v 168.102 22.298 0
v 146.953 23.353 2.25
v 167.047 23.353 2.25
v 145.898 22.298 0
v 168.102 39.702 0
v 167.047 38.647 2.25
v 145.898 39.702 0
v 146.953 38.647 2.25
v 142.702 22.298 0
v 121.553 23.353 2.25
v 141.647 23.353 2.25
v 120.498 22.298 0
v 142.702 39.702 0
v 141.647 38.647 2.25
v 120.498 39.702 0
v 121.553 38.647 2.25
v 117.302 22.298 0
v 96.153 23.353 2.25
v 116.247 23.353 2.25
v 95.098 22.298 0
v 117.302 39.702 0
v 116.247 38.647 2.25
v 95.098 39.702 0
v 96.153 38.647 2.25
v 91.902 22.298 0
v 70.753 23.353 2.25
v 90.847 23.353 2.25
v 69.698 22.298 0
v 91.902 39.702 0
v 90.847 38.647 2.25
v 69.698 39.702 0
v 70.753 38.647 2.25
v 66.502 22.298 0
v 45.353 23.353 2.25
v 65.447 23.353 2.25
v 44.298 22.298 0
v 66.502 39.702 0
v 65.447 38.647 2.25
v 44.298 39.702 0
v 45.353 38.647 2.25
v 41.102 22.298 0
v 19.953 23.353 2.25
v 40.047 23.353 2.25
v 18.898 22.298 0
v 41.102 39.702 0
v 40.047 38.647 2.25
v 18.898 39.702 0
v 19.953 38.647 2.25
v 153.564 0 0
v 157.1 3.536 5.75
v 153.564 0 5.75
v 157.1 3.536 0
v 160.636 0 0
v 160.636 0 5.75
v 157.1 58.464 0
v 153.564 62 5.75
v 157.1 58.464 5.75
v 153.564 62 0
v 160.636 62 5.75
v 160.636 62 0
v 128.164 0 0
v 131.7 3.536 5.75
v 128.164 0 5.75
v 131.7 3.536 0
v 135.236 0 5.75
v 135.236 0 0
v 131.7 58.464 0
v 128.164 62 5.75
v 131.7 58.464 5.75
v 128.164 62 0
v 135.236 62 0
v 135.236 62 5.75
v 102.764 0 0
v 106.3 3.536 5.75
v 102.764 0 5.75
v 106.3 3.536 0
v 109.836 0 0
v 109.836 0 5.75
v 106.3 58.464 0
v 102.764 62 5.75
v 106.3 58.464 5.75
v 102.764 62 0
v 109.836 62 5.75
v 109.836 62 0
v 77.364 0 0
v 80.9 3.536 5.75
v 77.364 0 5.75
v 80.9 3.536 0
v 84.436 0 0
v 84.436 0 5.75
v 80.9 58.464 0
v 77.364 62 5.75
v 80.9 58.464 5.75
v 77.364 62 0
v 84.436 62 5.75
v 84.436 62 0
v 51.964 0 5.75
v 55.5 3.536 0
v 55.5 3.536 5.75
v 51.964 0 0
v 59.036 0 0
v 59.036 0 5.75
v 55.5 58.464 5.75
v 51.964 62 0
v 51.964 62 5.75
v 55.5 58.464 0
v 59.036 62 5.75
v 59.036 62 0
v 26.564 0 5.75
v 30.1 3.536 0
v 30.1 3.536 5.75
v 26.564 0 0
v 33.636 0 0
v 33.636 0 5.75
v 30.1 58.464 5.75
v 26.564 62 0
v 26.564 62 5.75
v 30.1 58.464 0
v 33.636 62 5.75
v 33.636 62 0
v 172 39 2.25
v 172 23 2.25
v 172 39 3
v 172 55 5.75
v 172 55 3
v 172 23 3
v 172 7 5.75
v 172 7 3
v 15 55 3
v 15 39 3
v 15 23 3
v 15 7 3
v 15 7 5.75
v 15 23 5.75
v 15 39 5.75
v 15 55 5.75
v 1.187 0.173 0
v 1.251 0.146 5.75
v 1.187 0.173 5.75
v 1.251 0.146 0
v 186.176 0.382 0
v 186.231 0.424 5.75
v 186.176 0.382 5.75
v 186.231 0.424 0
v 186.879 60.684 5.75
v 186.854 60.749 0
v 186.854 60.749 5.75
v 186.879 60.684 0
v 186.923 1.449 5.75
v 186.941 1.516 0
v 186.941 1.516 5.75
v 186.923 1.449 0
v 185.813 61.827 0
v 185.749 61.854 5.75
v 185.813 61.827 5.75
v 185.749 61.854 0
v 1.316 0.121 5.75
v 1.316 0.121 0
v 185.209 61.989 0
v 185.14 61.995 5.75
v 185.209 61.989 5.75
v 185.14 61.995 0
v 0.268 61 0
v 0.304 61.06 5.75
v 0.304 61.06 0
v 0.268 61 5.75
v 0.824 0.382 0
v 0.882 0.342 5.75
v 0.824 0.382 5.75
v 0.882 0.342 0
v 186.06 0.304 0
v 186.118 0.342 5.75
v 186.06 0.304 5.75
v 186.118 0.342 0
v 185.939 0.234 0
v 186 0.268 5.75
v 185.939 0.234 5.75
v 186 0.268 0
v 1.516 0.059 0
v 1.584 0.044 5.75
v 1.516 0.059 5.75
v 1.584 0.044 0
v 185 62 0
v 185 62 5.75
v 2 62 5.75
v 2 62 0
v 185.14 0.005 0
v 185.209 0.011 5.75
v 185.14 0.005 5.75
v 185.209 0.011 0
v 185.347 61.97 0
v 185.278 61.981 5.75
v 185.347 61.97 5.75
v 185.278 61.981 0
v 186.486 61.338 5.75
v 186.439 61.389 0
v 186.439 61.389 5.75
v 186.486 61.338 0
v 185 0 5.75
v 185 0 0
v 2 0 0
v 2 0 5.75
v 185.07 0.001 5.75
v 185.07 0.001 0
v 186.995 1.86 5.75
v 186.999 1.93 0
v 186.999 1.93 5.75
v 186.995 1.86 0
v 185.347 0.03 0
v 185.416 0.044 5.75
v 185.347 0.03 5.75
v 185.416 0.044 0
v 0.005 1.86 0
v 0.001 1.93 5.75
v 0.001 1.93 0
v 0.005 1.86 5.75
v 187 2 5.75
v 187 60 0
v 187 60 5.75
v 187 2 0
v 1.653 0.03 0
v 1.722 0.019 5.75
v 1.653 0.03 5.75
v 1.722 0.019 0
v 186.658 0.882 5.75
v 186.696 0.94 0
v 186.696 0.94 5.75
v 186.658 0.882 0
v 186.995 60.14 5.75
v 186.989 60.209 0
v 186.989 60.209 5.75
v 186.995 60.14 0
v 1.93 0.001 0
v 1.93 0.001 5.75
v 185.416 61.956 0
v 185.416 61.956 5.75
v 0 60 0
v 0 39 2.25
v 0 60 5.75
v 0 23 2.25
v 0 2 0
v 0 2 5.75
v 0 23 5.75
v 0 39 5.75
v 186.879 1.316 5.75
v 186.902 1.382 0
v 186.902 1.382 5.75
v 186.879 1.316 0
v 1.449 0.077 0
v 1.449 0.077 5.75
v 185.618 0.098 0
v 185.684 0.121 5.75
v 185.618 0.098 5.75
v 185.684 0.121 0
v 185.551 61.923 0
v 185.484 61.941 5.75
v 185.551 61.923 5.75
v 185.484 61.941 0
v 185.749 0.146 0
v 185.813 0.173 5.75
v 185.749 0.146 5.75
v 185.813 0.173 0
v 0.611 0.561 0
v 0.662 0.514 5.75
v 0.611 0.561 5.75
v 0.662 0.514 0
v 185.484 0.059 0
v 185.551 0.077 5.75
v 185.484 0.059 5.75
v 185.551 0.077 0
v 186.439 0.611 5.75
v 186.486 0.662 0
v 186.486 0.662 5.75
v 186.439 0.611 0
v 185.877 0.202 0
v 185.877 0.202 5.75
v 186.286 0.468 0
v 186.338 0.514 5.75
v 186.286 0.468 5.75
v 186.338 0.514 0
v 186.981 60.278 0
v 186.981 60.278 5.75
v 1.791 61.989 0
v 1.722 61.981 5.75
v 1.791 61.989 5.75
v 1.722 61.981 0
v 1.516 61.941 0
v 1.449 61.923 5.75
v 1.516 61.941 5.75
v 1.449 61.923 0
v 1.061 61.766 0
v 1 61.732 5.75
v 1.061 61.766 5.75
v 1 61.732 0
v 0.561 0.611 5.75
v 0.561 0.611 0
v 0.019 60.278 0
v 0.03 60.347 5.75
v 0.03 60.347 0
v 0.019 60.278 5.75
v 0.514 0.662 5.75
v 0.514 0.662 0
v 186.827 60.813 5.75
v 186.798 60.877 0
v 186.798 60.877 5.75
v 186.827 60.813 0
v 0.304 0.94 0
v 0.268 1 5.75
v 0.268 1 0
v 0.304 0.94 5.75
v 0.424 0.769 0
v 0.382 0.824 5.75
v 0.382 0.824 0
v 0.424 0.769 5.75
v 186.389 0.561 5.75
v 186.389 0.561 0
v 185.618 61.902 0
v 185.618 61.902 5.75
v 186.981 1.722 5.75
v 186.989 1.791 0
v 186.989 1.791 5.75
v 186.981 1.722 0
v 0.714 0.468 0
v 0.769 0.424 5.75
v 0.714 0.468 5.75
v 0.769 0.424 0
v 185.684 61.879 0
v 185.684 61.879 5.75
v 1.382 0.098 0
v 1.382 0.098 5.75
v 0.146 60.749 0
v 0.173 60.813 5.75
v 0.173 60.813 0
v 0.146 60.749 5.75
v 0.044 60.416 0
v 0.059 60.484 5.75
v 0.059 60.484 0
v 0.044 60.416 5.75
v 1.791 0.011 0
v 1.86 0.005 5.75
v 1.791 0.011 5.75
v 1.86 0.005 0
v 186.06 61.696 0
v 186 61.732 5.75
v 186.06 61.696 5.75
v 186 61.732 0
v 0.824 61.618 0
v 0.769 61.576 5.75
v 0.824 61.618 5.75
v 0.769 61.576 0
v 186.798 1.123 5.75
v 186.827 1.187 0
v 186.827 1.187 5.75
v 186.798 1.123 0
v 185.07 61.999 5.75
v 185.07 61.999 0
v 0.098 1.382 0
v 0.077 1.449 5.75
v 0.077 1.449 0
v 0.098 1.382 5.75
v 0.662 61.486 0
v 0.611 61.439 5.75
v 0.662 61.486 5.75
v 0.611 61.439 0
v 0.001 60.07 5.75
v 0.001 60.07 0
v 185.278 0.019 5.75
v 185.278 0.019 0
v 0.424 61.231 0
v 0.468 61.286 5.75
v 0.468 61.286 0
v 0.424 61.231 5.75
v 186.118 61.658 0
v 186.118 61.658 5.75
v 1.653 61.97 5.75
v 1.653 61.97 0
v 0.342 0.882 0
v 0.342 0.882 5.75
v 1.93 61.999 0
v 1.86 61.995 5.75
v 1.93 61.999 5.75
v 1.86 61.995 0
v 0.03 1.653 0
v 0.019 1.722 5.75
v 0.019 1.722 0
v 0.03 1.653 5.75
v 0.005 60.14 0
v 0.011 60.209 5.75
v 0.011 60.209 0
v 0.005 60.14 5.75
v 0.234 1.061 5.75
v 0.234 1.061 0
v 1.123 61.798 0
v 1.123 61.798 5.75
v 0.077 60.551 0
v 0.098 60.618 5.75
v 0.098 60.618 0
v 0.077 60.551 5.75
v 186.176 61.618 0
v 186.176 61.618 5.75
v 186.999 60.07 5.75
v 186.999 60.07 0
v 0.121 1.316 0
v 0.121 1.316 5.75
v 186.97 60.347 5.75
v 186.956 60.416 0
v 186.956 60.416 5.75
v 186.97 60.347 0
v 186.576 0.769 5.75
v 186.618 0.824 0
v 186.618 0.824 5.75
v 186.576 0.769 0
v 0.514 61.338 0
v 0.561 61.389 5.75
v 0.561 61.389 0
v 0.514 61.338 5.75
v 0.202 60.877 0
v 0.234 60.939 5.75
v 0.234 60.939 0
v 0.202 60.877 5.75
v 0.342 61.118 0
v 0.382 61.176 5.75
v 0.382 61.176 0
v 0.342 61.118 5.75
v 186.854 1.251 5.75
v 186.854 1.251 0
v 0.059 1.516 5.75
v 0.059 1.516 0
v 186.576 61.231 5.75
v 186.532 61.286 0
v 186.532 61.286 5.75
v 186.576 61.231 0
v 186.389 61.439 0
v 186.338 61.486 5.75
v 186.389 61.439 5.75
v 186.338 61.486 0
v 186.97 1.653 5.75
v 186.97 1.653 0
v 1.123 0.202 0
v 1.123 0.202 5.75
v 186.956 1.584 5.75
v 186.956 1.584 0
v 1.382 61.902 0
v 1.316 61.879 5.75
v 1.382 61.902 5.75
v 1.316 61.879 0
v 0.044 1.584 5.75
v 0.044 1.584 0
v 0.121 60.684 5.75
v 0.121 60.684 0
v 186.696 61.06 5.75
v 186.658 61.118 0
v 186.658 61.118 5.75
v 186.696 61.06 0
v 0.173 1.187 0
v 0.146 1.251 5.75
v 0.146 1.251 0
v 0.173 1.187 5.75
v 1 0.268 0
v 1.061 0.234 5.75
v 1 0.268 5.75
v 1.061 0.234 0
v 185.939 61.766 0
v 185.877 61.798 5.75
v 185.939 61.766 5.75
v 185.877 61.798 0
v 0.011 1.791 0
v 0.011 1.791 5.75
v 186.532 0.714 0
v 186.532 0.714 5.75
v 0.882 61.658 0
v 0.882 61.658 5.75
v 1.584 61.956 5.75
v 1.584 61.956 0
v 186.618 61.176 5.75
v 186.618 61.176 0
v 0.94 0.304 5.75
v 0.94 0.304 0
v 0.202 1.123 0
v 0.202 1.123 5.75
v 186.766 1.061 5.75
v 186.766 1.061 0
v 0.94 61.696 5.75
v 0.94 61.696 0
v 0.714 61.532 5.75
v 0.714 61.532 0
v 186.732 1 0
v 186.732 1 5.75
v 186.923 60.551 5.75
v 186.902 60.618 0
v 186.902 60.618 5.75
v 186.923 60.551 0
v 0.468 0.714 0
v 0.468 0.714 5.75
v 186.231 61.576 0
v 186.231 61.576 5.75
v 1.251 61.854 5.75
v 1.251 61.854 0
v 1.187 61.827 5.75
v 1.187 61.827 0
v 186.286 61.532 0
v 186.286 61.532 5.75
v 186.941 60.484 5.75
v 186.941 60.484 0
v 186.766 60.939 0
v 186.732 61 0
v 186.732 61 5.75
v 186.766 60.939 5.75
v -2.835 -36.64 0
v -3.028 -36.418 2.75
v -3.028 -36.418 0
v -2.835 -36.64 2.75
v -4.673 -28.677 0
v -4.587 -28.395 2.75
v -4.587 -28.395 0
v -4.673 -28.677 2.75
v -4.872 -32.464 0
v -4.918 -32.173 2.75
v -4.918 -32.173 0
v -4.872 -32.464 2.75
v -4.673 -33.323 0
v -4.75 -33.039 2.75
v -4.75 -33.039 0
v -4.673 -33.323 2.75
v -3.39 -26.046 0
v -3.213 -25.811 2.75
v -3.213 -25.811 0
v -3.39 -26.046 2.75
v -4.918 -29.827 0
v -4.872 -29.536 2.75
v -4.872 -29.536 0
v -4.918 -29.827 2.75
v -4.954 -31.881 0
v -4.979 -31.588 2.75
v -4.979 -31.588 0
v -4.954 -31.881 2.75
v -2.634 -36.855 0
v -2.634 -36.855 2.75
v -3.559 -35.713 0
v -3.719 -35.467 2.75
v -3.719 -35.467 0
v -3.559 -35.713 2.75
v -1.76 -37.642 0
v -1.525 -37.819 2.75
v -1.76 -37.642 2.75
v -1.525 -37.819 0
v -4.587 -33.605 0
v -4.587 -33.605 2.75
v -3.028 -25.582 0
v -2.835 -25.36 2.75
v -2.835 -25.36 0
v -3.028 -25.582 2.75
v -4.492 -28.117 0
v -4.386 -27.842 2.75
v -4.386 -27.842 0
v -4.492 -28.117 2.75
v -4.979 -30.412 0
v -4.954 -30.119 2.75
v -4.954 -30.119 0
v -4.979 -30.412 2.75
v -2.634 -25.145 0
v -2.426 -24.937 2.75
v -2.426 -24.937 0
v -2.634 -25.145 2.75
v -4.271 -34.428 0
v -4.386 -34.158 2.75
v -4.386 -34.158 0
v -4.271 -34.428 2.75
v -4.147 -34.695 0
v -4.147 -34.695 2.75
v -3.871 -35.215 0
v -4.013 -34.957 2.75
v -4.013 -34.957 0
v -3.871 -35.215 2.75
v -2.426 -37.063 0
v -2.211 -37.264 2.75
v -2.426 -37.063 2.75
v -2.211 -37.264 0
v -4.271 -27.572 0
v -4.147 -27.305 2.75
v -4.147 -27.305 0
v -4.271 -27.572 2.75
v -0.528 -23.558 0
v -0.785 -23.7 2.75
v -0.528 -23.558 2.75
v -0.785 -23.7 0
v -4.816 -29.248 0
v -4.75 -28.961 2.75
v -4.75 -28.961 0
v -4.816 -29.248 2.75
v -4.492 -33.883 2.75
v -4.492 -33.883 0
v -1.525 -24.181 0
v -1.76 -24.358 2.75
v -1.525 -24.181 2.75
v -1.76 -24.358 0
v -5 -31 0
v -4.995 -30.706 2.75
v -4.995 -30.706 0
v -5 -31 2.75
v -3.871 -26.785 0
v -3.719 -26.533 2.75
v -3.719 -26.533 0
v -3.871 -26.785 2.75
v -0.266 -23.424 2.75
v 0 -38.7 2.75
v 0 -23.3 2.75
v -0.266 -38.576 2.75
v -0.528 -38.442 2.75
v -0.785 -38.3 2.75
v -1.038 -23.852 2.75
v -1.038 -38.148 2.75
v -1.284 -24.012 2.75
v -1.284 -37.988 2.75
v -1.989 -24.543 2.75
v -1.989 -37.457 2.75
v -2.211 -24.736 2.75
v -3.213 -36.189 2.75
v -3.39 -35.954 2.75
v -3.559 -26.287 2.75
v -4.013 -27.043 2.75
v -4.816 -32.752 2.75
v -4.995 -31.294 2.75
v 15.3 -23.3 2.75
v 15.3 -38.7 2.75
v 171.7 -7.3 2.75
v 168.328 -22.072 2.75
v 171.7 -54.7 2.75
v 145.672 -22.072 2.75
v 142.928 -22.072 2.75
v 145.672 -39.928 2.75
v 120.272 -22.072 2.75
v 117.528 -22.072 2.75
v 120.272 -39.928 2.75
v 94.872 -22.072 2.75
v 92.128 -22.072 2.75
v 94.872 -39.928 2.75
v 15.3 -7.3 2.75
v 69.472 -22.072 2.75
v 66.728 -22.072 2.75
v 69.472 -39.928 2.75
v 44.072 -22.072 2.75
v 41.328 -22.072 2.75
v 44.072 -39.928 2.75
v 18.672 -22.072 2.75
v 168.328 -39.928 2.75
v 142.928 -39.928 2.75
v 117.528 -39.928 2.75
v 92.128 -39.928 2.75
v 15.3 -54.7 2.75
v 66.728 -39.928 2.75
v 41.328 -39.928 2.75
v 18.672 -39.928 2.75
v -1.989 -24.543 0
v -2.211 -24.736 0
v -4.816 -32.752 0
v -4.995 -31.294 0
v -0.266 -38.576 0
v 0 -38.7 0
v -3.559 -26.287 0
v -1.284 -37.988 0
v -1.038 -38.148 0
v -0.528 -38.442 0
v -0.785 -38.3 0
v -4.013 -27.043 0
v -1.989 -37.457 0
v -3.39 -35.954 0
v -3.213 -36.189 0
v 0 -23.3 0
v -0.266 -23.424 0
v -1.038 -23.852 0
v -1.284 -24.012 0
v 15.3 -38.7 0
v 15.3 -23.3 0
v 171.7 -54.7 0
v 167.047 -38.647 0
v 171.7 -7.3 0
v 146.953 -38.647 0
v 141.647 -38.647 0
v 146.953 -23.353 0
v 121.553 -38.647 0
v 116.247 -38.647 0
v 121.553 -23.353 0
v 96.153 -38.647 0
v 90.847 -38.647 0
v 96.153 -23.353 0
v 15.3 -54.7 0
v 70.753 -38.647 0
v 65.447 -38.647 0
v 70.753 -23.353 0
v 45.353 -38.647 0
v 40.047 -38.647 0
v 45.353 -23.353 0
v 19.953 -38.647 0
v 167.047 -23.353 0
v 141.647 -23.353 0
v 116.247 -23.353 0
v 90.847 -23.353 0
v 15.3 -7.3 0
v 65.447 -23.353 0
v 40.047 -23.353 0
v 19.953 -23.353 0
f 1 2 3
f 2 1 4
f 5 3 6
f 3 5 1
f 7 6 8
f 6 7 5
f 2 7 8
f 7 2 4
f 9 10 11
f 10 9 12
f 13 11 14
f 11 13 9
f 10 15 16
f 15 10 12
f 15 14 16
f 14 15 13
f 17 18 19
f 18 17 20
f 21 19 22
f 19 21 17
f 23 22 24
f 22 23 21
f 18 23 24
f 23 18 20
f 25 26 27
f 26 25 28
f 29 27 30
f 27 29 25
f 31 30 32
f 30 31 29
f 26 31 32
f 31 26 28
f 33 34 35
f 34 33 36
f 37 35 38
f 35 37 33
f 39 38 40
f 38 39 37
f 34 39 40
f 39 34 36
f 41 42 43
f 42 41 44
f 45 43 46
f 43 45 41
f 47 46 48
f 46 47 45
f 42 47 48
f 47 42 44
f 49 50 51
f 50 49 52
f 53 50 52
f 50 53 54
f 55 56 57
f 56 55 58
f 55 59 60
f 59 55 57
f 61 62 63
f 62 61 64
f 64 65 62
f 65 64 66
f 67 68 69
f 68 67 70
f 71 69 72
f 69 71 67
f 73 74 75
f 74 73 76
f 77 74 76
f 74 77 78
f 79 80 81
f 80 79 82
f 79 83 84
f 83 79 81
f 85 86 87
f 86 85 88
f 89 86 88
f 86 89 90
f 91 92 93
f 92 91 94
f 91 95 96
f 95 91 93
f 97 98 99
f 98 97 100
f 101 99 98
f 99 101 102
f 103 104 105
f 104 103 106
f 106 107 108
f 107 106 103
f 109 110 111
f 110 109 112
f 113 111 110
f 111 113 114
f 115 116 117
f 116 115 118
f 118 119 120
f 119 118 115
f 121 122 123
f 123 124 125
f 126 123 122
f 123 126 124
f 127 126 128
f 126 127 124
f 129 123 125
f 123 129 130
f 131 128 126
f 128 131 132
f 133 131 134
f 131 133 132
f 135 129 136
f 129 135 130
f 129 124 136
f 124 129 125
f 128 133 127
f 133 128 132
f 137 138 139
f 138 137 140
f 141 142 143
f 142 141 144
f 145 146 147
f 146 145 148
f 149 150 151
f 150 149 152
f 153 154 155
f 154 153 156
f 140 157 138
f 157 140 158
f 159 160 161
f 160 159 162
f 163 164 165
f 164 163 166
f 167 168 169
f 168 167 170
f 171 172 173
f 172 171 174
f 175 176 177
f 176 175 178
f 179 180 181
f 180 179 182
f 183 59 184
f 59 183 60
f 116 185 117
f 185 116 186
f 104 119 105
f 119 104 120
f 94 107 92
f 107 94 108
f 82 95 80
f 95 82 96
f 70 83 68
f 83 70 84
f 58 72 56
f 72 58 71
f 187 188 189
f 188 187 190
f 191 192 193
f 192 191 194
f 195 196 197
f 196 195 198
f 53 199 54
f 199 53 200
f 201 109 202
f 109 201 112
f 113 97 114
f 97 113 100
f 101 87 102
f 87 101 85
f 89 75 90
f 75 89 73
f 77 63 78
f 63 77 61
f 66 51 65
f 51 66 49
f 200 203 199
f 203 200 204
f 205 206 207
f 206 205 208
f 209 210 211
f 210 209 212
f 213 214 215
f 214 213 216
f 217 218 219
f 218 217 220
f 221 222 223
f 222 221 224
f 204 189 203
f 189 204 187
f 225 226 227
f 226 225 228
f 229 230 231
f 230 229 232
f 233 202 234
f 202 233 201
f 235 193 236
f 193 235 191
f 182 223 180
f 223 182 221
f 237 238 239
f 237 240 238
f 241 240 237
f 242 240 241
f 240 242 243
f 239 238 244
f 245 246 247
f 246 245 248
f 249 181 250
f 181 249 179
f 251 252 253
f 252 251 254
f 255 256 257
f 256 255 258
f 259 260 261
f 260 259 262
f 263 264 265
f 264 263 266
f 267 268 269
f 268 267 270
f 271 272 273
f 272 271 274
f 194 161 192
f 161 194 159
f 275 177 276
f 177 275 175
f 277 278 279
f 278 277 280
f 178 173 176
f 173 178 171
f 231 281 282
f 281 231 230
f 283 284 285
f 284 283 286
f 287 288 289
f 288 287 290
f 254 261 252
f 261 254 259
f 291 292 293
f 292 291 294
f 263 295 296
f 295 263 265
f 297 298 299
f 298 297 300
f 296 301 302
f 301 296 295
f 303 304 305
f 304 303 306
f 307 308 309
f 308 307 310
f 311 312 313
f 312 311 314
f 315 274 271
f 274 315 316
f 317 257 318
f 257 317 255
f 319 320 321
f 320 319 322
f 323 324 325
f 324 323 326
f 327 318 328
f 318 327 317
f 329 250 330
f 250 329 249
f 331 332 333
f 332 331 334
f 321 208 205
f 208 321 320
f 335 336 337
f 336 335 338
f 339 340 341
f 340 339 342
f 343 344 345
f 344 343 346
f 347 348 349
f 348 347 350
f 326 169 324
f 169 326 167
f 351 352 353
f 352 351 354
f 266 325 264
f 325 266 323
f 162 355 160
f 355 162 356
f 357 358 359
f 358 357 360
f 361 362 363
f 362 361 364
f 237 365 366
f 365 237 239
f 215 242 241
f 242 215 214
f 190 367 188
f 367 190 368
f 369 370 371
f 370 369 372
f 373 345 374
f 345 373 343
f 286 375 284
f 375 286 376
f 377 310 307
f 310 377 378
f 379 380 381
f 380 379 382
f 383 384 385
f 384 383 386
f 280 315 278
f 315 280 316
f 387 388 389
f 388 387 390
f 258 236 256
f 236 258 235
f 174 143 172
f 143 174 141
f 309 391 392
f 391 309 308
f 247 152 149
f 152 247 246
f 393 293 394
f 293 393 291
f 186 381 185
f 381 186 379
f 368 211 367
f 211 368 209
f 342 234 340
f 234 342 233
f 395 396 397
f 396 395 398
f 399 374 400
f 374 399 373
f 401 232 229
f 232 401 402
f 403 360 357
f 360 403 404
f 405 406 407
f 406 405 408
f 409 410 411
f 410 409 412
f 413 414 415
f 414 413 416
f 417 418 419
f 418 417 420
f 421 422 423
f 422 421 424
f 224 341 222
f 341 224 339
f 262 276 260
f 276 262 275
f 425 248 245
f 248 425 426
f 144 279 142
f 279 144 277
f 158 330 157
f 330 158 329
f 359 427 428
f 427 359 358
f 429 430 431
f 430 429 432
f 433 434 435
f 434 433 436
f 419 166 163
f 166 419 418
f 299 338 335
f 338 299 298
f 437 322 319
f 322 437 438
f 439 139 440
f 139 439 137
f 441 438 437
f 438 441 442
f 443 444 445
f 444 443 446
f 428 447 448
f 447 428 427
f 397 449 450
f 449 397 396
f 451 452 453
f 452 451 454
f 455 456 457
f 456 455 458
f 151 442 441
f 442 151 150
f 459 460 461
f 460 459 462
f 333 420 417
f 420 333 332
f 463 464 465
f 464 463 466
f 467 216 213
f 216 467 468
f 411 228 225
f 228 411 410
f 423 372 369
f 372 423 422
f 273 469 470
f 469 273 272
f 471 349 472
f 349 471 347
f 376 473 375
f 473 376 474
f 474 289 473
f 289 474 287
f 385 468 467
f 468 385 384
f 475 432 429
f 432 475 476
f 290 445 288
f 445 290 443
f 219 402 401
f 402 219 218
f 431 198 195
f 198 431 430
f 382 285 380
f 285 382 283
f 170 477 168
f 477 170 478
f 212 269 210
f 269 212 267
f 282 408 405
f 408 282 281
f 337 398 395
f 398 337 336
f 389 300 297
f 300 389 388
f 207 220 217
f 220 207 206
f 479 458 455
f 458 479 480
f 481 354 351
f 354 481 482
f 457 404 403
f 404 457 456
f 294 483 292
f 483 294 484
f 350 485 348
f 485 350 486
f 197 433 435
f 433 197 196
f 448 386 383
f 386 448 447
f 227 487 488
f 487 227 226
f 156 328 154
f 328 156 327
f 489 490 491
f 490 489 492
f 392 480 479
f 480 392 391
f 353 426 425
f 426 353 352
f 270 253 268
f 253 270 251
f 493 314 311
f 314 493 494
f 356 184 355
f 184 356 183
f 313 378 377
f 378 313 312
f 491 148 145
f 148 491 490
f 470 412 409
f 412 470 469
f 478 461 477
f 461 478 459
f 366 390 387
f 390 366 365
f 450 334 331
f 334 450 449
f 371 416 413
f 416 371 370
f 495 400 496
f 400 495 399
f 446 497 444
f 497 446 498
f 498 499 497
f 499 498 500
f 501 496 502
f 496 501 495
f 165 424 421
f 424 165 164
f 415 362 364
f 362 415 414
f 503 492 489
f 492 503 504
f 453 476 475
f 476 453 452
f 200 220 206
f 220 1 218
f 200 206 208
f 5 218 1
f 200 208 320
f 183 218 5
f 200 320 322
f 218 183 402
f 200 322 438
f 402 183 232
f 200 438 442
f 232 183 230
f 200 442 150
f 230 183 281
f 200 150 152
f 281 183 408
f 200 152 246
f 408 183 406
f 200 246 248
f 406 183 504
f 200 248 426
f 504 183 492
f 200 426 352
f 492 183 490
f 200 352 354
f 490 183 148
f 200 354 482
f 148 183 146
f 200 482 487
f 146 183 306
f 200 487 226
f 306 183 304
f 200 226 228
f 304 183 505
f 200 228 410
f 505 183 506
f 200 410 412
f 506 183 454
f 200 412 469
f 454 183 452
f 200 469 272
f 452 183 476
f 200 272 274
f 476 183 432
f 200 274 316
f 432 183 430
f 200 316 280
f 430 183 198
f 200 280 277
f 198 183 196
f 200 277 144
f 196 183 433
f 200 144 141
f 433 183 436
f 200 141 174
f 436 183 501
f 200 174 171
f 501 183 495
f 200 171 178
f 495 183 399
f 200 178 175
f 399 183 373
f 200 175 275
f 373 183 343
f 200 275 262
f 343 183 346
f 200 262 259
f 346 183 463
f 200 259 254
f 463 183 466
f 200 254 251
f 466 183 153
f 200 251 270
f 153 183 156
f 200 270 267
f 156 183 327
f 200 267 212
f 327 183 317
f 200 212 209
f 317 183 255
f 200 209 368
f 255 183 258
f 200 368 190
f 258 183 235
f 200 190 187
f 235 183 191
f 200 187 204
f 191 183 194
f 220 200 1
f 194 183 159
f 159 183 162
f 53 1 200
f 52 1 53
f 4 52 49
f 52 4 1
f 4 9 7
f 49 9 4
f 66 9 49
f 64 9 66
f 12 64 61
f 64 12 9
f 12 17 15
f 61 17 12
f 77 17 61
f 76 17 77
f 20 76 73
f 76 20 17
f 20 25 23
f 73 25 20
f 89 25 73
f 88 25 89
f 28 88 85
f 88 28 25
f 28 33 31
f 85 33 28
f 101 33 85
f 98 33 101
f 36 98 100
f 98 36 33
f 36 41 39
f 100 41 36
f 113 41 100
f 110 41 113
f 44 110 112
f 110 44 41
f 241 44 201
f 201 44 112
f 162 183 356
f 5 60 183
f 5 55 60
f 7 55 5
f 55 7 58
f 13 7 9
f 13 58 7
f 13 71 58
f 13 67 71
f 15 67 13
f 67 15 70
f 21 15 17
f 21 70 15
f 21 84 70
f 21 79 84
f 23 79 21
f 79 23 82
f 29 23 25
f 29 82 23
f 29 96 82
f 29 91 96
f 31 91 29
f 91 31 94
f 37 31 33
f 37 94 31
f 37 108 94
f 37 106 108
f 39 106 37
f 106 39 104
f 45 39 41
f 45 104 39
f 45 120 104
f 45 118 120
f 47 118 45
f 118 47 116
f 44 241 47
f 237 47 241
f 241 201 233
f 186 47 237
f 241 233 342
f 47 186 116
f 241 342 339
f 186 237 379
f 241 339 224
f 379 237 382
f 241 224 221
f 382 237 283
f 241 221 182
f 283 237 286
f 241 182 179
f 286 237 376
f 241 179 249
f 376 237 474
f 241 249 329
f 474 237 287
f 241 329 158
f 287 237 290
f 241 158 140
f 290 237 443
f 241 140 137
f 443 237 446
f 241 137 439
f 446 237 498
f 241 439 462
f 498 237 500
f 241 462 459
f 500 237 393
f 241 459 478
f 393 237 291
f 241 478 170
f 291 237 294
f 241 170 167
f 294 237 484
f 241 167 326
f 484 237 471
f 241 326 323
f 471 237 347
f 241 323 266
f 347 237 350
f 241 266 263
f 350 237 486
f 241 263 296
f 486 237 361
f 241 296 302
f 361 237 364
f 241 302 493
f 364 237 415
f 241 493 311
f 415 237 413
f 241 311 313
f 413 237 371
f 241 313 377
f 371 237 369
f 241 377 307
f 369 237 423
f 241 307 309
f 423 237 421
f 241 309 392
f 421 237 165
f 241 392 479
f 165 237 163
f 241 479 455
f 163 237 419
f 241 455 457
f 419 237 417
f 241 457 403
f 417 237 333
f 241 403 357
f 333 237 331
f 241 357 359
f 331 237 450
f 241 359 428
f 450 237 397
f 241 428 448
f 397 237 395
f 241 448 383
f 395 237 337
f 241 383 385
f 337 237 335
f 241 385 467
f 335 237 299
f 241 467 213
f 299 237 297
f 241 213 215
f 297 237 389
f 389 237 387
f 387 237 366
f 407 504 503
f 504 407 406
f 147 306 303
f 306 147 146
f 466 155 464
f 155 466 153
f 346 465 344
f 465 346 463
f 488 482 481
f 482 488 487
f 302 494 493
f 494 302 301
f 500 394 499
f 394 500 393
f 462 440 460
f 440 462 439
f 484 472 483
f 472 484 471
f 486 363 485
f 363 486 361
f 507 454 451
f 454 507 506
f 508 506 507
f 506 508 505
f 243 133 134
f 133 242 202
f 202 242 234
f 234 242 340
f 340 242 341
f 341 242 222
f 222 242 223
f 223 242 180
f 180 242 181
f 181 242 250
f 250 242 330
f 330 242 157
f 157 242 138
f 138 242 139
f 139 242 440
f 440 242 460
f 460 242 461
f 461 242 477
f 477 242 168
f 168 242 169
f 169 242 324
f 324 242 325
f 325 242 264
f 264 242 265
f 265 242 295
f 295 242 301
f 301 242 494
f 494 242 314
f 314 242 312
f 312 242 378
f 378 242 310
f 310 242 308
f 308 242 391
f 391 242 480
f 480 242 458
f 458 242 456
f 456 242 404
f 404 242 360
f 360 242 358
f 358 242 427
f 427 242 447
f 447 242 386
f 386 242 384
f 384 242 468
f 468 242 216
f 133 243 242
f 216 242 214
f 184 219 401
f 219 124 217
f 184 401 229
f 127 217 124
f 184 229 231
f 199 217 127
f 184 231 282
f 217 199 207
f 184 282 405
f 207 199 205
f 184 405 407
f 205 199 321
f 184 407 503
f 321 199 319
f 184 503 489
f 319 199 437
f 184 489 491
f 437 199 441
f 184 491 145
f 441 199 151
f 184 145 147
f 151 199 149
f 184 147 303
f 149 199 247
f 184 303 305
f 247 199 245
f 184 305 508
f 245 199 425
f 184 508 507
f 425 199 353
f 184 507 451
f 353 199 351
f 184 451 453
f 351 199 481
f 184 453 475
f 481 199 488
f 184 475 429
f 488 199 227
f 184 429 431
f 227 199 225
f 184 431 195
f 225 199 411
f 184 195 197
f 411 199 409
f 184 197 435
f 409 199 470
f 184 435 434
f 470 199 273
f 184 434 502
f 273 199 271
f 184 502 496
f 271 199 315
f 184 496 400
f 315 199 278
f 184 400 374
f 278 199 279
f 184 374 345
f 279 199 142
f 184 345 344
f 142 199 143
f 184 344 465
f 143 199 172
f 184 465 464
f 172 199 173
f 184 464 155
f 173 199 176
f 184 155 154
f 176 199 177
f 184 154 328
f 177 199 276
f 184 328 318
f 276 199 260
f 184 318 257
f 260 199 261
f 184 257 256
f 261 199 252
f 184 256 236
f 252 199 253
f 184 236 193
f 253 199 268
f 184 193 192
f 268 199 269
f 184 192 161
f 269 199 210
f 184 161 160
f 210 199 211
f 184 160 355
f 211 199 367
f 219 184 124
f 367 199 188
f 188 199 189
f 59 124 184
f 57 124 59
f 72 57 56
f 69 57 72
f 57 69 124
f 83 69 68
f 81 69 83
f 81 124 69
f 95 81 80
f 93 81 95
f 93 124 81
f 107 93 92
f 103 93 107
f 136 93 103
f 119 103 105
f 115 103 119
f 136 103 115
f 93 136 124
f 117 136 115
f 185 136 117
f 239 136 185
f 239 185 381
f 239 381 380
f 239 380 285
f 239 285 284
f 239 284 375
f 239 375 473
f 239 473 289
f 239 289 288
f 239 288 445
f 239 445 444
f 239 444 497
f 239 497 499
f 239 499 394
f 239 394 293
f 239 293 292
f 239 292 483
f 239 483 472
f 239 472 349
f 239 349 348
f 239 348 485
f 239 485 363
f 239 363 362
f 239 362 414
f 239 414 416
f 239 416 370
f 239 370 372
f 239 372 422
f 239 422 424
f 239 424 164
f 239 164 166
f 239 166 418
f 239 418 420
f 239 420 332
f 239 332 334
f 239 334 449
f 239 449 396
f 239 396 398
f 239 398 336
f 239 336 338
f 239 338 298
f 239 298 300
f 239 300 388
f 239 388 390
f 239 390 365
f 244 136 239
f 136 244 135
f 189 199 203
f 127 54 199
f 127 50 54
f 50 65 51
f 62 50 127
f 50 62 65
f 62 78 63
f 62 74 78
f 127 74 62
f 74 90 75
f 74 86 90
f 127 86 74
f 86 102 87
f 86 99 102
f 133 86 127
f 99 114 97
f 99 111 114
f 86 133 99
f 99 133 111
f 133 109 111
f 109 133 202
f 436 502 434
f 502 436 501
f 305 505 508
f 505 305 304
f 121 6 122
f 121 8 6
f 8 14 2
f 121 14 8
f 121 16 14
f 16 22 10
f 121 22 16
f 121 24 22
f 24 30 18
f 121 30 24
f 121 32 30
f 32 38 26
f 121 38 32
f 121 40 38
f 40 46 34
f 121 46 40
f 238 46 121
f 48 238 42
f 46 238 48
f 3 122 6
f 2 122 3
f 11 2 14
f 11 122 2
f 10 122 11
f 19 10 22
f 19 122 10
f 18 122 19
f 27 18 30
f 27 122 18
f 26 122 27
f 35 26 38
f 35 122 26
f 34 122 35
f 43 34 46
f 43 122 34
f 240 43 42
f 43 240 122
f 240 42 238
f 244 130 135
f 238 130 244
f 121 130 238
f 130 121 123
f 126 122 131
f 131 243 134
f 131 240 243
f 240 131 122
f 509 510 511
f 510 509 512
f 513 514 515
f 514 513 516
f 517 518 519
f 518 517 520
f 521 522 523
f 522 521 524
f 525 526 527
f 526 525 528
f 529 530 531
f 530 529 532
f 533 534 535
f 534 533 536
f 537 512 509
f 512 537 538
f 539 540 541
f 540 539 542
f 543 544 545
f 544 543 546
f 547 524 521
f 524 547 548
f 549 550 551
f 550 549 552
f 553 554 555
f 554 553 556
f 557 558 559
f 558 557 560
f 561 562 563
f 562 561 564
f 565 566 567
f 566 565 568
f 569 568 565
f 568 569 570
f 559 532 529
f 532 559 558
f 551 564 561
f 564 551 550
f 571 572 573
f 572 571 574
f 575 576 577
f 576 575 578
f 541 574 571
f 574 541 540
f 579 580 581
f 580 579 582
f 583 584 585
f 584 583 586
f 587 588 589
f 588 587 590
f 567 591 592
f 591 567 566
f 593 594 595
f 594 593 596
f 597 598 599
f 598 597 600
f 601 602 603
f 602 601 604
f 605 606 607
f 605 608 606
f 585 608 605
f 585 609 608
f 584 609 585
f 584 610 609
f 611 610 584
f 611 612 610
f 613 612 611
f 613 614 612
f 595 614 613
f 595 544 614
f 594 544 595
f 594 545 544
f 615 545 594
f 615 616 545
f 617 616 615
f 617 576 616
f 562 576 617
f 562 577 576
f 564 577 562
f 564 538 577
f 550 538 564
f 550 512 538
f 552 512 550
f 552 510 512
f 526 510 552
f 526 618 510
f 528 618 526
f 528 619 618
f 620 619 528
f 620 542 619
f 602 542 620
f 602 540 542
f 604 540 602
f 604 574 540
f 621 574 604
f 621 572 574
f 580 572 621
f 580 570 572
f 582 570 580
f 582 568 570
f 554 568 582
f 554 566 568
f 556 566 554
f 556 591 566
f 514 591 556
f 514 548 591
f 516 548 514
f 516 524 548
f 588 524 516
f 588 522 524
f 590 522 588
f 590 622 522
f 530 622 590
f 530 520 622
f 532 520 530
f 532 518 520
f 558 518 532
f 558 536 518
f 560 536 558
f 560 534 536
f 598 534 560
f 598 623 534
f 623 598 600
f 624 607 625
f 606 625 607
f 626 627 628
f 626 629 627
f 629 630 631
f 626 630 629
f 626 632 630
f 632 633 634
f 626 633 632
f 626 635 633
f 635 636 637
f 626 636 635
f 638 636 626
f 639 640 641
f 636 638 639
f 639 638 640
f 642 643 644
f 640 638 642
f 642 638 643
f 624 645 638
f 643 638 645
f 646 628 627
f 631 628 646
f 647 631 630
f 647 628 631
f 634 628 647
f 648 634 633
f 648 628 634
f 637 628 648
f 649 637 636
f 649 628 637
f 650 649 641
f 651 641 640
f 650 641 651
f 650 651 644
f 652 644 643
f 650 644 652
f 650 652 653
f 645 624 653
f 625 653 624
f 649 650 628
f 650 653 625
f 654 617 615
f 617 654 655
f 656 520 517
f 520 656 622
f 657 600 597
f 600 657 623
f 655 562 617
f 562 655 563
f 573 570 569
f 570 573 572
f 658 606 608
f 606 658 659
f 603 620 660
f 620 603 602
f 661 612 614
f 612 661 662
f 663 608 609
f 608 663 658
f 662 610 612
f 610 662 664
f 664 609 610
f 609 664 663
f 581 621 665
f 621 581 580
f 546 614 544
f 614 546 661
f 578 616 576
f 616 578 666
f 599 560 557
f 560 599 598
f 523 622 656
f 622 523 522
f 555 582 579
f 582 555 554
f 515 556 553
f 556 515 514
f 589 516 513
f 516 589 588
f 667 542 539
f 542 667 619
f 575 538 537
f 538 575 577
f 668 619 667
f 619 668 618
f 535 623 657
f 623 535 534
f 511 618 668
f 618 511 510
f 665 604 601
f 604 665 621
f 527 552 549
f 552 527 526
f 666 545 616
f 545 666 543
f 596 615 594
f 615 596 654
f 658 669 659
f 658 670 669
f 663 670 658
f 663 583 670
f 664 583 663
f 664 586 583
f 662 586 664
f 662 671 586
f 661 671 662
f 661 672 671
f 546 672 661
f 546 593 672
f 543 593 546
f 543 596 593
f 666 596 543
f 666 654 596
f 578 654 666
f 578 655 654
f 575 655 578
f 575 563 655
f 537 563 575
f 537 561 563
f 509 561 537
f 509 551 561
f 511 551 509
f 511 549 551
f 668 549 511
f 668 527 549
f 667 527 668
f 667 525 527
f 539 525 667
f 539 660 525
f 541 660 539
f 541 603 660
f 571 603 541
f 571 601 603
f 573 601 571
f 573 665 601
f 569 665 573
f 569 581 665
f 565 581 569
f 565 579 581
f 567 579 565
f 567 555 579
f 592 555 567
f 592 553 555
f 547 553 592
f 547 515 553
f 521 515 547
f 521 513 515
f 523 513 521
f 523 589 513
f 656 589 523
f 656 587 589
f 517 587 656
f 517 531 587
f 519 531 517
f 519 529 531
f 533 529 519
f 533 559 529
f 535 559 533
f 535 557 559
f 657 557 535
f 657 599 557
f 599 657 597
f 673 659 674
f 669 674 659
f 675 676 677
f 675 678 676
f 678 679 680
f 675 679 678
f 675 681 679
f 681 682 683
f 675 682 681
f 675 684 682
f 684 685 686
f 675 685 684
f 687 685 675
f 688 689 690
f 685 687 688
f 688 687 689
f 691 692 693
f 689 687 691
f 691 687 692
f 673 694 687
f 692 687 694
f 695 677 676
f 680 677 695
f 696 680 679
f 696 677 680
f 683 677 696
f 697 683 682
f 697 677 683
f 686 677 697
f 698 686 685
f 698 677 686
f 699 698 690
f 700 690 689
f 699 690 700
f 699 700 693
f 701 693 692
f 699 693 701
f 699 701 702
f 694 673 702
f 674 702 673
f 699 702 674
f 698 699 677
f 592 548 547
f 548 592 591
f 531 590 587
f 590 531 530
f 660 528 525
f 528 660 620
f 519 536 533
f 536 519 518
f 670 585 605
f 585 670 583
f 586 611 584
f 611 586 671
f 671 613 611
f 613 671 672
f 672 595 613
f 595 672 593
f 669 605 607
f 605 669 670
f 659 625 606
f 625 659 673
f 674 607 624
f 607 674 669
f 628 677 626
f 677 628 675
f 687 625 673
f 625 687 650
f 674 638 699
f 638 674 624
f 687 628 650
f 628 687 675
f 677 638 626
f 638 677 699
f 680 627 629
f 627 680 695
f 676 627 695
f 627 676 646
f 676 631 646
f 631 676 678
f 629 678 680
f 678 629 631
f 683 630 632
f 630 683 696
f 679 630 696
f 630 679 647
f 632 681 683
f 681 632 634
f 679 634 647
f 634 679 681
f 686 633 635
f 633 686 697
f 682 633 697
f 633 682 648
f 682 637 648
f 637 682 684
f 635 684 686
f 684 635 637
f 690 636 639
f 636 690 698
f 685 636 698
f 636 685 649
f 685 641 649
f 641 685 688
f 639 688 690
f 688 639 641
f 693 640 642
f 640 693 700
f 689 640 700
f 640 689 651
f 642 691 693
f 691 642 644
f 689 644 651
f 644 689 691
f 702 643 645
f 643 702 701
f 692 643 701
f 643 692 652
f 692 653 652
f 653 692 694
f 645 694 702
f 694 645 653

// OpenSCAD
/*
 * Film Holder for Plustek OpticFilm scanners and 110 films.
 *
 * (C) 2016 Richard "Shred" Körber
 *
 * Project page on Thingiverse:
 *   https://www.thingiverse.com/thing:1328672
 *
 * Licensed under Creative Commons BY-NC-SA:
 *   https://creativecommons.org/licenses/by-nc-sa/3.0/
 */


// Also depends on your printer size!
numberOfWindows = 6;    // [1:20]

// Use struts to save some material?
saveMaterial = "false"; // [false:No, true:Yes]


// trick the customizer into ignoring the following variables...
module endOfParameters() {}



height = 5.75;          // Total height (Z)
innerHeight = 3;        // Height of inner frame (Z)
minkRadius = 2;         // Minkowski radius for outer frame

totalWidth = 62;        // Total width (Y)
filmWidth = 16;         // Film width (Y)
filmThickness = 0.75;   // Film thickness (Z)

windowLength = 20;      // Length of a single window (X)
windowOffset = 5;       // Offset of first window to right frame edge (X)
windowDistance = 25.4;  // Distance between windows (X)
windowGap = 0.4;        // Gap size on each side (Y)

notchSize = 5;          // Length (X) of transport notches (depth is half of it)
notchHeight = height;   // Height (Z) of notches

coverFrameSizeX = 15;   // Distance outer edge to cover edge (X)
coverFrameSizeY = 7;    // Distance outer edge to cover edge (Y)
coverGap = 0.3;         // Gap between outer and inner edges

strutsThickness = 4;    // Thickness of the save material struts

cutHeight = height + 2;
windowCount = numberOfWindows;
windowWidth = filmWidth - 2 * windowGap;
filmLength = windowCount * windowDistance - (windowDistance - windowLength) + 2 * windowOffset;
totalLength = filmLength + 2 * coverFrameSizeX;
coverHeight = height - innerHeight;



// Holder Base
module holder() {
    translate([minkRadius, minkRadius, 0]) {
        minkowski() {
            cube([totalLength - minkRadius * 2, totalWidth- minkRadius * 2, height - 1]);
            cylinder(r=minkRadius, h=1);
        }
    }
}

// Cover Cutout
module coverCutout() {
    translate([0, coverFrameSizeY, innerHeight])
        cube([filmLength, totalWidth - coverFrameSizeY * 2, cutHeight]);
}

// Triangles (for the struts)
module triangle(dim) {
    polyhedron(
        points = [
            [0, 0, 0],
            [dim[0], 0, 0],
            [dim[0], dim[1], 0],
            [0, 0, dim[2]],
            [dim[0], 0, dim[2]],
            [dim[0], dim[1], dim[2]]
        ],
        faces = [
            [0, 1, 2], [3, 5, 4],
            [0, 3, 4, 1], [1, 4, 5, 2], [0, 2, 5, 3]

        ]
    );
}

// Circlular segment
module circlePart(dim) {
    r = (4 * pow(dim[0], 2) + pow(dim[1], 2)) / (8 * dim[0]);
    translate([r - dim[0], dim[1] / 2, dim[2] / 2]) {
        difference() {
            cylinder(h=dim[2], r=r, center=true);
            translate([dim[0], 0, -0.2]) cube([r*2, r*2, dim[2] + 0.5], center=true);
        }
    }
}

// Draws a single scan window
module window(wHeight) {
    chh = wHeight / 2;
    ihh = wHeight + 0.2;
    polyhedron(
        points = [
            [-chh, -chh, 0],
            [windowLength + chh, -chh, 0],
            [windowLength + chh, windowWidth + chh, 0],
            [-chh, windowWidth + chh, 0],
            [0, 0, ihh],
            [windowLength, 0, ihh],
            [windowLength, windowWidth, ihh],
            [0, windowWidth, ihh]
        ],
        faces = [
            [0, 4, 5, 1], [1, 5, 6, 2], [2, 6, 7, 3],
            [3, 7, 4, 0], [0, 1, 2, 3], [4, 7, 6, 5]
        ]
    );
}

// Draws all the windows
module windows(wHeight) {
    for (i = [filmLength - windowLength - windowOffset : -windowDistance : 0]) {
        translate([i, 0, -0.1]) window(wHeight);
    }
}

// Draws a single notch
module notch() {
    rotate([0, 0, 45]) translate([0, 0, (notchHeight / 2) - 0.1])
        cube([notchSize, notchSize, notchHeight + 0.3], center=true);
}

// Draws all the notches
module notches() {
    for (i = [filmLength - windowLength - windowOffset : -windowDistance : 0]) {
        translate([i + (windowWidth + windowOffset) / 2, 0, 0]) notch();
        translate([i + (windowWidth + windowOffset) / 2, totalWidth, 0]) notch();
    }
}

// Draws a cutout pattern to save material
module cutoutPattern(dim) {
    tw = dim[0] / 4;
    to = strutsThickness / 2;
    for (j = [0 : tw : dim[0] - 1]) {
        translate([j + to, 0, 0]) {
            triangle([tw - to * 1.5, dim[1] - to, dim[2]]);
        }
        translate([j + tw - to, dim[1], 0]) rotate([0, 0, 180]) {
            triangle([tw - to * 1.5, dim[1] - to, dim[2]]);
        }
    }
}

// If saving material, draws a cutout pattern above and below the windows
module saveMaterialCutout(length, border = 0) {
    if (saveMaterial == "true") {
        smHeight = (totalWidth - coverFrameSizeY * 2 - filmWidth) / 2 - strutsThickness;

        translate([0, totalWidth - coverFrameSizeY - smHeight, -0.1]) {
            cutoutPattern([length, smHeight - border, cutHeight]);
        }
        translate([0, coverFrameSizeY + border, -0.1]) {
            cutoutPattern([length, smHeight - border, cutHeight]);
        }
    }
}

// Draws the cover plate (without cutouts)
module coverPlate() {
    union() {
        translate([(totalLength - filmLength) / 2 + coverGap, 0, 0]) {
            cube([
                filmLength - coverGap * 2,
                totalWidth - coverFrameSizeY * 2 - coverGap * 2,
                coverHeight
            ]);
        }

        translate([
            0,
            (totalWidth - filmWidth - coverFrameSizeY * 2) / 2,
            0
        ]) {
            cube([
                coverFrameSizeX + coverGap * 4,
                filmWidth - coverGap * 2,
            coverHeight
            ]);
            circlePart([5, filmWidth - coverGap * 2, coverHeight]);
        }
    }

}

// Draws the entire holder bottom
module completeHolder() {
    difference() {
        holder();

        translate([-0.1, (totalWidth - filmWidth) / 2, innerHeight - filmThickness]) {
            cube([filmLength + coverFrameSizeX + 0.1, filmWidth, height]);
        }

        translate([
            (totalLength - filmLength) / 2,
            (totalWidth - filmWidth) / 2 + windowGap,
            -filmThickness])
        {
            windows(innerHeight);
        }

        translate([(totalLength - filmLength) / 2, 0, 0]) {
            coverCutout();
            notches();
            saveMaterialCutout(filmLength);
        }
    }
}

// Draws the entire holder top cover
module completeCover() {
    difference() {
        translate([0, coverFrameSizeY + coverGap, 0]) {
            coverPlate();
        }
        
        translate([
            (totalLength - filmLength) / 2,
            (totalWidth - filmWidth) / 2 + windowGap,
            0])
        {
            windows(coverHeight);
        }

        translate([(totalLength - filmLength) / 2 + strutsThickness, 0, 0]) {
            saveMaterialCutout(filmLength - strutsThickness * 2, strutsThickness);
        }
    }
}





completeHolder();

translate([0, 0, coverHeight]) rotate([180, 0, 0]) completeCover();

// uncomment to find out if the top cover fits into the holder
// translate([0, 0, height]) mirror([0, 0, 1]) completeCover();



$fn = 180;
